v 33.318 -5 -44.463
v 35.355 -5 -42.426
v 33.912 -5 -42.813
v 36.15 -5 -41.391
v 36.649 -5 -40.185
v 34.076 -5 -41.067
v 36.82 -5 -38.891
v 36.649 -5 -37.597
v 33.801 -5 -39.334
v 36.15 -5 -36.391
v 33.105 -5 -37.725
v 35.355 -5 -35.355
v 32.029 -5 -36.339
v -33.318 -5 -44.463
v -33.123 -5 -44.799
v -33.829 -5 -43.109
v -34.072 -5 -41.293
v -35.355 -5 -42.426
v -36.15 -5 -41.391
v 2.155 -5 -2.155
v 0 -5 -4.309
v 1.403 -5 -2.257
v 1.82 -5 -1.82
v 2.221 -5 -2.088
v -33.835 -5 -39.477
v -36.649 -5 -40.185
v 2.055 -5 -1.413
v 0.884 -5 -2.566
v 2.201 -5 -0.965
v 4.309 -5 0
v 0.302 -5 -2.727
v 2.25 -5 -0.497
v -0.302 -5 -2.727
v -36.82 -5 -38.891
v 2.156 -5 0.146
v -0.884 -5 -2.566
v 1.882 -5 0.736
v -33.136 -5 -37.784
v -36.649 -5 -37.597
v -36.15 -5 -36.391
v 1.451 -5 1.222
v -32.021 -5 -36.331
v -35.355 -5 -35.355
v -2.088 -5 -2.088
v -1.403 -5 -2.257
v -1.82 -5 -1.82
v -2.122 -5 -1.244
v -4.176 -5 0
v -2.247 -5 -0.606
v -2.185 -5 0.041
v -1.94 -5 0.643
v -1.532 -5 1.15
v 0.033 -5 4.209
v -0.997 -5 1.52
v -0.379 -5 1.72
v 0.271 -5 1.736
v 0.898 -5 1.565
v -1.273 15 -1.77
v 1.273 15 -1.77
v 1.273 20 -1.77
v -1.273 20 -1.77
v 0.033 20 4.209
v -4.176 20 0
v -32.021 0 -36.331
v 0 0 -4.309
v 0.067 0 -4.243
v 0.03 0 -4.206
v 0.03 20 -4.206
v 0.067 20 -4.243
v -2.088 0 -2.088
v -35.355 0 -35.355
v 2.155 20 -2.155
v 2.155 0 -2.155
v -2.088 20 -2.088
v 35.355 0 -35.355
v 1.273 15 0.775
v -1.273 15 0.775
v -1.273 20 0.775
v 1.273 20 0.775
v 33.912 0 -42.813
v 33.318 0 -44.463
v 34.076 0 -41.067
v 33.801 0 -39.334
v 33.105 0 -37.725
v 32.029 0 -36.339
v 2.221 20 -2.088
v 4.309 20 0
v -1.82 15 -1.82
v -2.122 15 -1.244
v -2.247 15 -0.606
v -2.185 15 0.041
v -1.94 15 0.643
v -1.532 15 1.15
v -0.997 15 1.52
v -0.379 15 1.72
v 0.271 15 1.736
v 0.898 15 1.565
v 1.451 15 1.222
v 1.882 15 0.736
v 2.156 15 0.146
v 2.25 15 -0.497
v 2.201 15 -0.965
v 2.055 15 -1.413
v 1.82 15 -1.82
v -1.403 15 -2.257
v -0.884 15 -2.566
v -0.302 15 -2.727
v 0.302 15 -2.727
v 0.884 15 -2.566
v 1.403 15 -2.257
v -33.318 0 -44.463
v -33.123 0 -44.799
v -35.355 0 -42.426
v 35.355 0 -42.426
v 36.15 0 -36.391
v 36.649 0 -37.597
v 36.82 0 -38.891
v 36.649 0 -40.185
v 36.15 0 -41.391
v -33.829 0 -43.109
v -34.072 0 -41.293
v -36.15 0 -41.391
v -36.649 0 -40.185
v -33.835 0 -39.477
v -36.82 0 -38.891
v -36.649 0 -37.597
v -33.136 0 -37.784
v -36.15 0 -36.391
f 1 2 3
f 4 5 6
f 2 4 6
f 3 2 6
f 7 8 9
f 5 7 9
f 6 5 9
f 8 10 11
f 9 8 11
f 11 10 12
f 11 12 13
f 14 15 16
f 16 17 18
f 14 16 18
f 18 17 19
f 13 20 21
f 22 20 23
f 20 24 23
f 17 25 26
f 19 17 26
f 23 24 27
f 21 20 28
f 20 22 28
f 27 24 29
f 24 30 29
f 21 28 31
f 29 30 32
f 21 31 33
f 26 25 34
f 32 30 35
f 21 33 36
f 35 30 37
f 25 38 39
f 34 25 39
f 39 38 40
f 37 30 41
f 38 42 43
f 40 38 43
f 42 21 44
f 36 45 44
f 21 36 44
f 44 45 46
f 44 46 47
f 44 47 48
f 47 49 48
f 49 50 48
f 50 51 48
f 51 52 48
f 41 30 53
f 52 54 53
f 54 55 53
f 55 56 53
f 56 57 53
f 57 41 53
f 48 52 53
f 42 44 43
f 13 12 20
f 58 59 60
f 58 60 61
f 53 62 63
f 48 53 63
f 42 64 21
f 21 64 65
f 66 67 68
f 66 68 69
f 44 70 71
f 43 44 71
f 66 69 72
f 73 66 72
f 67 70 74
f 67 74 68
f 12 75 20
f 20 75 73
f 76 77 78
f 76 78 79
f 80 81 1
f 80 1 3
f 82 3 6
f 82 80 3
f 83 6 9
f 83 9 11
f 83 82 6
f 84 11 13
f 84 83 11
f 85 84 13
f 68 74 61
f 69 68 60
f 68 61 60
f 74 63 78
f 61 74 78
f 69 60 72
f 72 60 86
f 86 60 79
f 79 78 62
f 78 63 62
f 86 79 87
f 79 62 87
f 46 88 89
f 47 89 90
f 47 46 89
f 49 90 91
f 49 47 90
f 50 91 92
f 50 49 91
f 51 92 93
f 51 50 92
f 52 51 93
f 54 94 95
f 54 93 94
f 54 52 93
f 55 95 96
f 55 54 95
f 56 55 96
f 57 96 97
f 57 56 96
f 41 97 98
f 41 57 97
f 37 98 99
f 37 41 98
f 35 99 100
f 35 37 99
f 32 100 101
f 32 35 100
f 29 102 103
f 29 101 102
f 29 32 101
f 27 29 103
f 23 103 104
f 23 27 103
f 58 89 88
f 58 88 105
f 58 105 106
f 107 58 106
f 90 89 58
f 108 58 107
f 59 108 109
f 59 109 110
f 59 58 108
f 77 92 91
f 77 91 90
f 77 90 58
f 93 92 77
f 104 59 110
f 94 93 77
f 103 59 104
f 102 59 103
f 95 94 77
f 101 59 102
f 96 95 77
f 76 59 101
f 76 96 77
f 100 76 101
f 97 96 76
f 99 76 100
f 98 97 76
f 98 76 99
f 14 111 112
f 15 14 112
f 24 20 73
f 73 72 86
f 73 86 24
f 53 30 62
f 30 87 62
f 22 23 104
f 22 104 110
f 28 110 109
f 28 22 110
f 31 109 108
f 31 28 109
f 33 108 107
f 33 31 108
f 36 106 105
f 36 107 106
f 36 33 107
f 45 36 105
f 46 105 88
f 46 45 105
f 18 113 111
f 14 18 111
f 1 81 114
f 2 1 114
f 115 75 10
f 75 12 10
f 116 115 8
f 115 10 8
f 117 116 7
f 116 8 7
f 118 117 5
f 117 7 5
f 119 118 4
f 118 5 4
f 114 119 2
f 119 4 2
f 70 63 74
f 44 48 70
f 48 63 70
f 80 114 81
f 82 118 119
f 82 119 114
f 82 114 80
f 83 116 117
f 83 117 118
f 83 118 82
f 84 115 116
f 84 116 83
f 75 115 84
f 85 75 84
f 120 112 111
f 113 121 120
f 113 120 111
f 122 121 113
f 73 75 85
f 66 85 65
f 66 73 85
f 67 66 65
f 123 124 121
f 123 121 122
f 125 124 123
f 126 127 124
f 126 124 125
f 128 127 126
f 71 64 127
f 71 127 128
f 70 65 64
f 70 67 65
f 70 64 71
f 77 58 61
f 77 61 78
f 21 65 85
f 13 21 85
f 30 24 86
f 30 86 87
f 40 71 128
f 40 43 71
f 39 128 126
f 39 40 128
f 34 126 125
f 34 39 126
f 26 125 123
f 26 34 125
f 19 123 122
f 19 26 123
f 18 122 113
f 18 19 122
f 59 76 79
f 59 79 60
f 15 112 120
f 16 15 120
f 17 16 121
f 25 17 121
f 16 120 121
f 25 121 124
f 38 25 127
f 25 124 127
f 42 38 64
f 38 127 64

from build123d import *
from build123d import SkipClean  # not in build123d's __all__

# Parameters (mm, degrees)
F1_DEPTH    = 5
F2_DEPTH    = 20
F3_R        = 5
F4_START    = -15
F4_DEPTH    = 5
F5_T1_DEPTH = 5


# Not quite as in the source:
# - a fillet or chamfer that OpenCascade refuses, or shapes differently, is made with other operations: its cross-section is extruded or revolved along the edge and cut away or added
# - after a boolean that leaves OpenCascade's solid faulty, fix() repairs it
# - a feature names something its author has since deleted; it is built from what else it names


with BuildPart() as f1:
    # F0 (on Front) → F1 (new body)
    with BuildSketch(Plane.XZ):
        with BuildLine():
            Line((0.0300982685, -4.2060010783), (-2.0879514049, -2.0879514049))
            Line((-2.0879514049, -2.0879514049), (-38.8908729653, -38.8908729653))
            Line((-38.8908729653, -38.8908729653), (-33.3183881591, -44.4633577714))
            Line((-33.3183881591, -44.4633577714), (-33.1233781652, -44.7987950851))
            ThreePointArc((-33.1233781652, -44.7987950851), (-34.0132139837, -40.3773459148), (-32.0214836094, -36.3308621737))
            Line((-32.0214836094, -36.3308621737), (0, -4.3093785644))
            Line((0, -4.3093785644), (0.0667378772, -4.2426406871))
            Line((0.0667378772, -4.2426406871), (0.0300982685, -4.2060010783))
        make_face()
        with BuildLine():
            Line((-4.1759028099, 0), (-2.0879514049, -2.0879514049))
            Line((-2.0879514049, -2.0879514049), (-1.8201223283, -1.8201223283))
            ThreePointArc((-1.8201223283, -1.8201223283), (-0.6954224476, 1.6424563629), (2.25, -0.4973771865))
            ThreePointArc((2.25, -0.4973771865), (2.1398335494, -1.1927996342), (1.8201223283, -1.8201223283))
            Line((1.8201223283, -1.8201223283), (2.1546892822, -2.1546892822))
            Line((2.1546892822, -2.1546892822), (2.2214271594, -2.0879514049))
            Line((2.2214271594, -2.0879514049), (4.3093785644, 0))
            Line((4.3093785644, 0), (0.0333689386, 4.2092717485))
            Line((0.0333689386, 4.2092717485), (-4.1759028099, 0))
        make_face()
        with BuildLine():
            Line((-1.8201223283, -1.8201223283), (-2.0879514049, -2.0879514049))
            Line((-2.0879514049, -2.0879514049), (0.0300982685, -4.2060010783))
            Line((0.0300982685, -4.2060010783), (0.0667378772, -4.2426406871))
            Line((0.0667378772, -4.2426406871), (2.1546892822, -2.1546892822))
            Line((2.1546892822, -2.1546892822), (1.8201223283, -1.8201223283))
            ThreePointArc((1.8201223283, -1.8201223283), (0, -2.7473771865), (-1.8201223283, -1.8201223283))
        make_face()
        Polygon((2.1546892822, -2.1546892822), (0.0667378772, -4.2426406871), (0, -4.3093785644), (35.8313777613, -40.1407563256), (33.3183881591, -44.4633577714), (38.8908729653, -38.8908729653), align=None)
    extrude(amount=F1_DEPTH)

    # F0 (on Front) → F2 (join)
    with BuildSketch(Plane.XZ):
        with BuildLine():
            Line((-4.1759028099, 0), (-2.0879514049, -2.0879514049))
            Line((-2.0879514049, -2.0879514049), (-1.8201223283, -1.8201223283))
            ThreePointArc((-1.8201223283, -1.8201223283), (-0.6954224476, 1.6424563629), (2.25, -0.4973771865))
            ThreePointArc((2.25, -0.4973771865), (2.1398335494, -1.1927996342), (1.8201223283, -1.8201223283))
            Line((1.8201223283, -1.8201223283), (2.1546892822, -2.1546892822))
            Line((2.1546892822, -2.1546892822), (2.2214271594, -2.0879514049))
            Line((2.2214271594, -2.0879514049), (4.3093785644, 0))
            Line((4.3093785644, 0), (0.0333689386, 4.2092717485))
            Line((0.0333689386, 4.2092717485), (-4.1759028099, 0))
        make_face()
        with BuildLine():
            Line((-1.8201223283, -1.8201223283), (-2.0879514049, -2.0879514049))
            Line((-2.0879514049, -2.0879514049), (0.0300982685, -4.2060010783))
            Line((0.0300982685, -4.2060010783), (0.0667378772, -4.2426406871))
            Line((0.0667378772, -4.2426406871), (2.1546892822, -2.1546892822))
            Line((2.1546892822, -2.1546892822), (1.8201223283, -1.8201223283))
            ThreePointArc((1.8201223283, -1.8201223283), (0, -2.7473771865), (-1.8201223283, -1.8201223283))
        make_face()
    with SkipClean():  # cleaning this boolean's faces spoils the solid; the shape is the same uncleaned
        extrude(amount=-F2_DEPTH)

    # F3
    f3_edges = [f1.edges().sort_by_distance(p)[0] for p in [
        (38.890873, -2.5, -38.890873),
        (-38.890873, -2.5, -38.890873),
    ]]
    fillet(f3_edges, radius=F3_R)

    # F0 (on Front) → F4 (join)
    with BuildSketch(Plane.XZ.offset(F4_START)):
        with BuildLine():
            Line((1.2727922061, -1.2727922061), (1.4969489762, -1.4969489762))
            ThreePointArc((1.4969489762, -1.4969489762), (1.7225719371, -1.0196280089), (1.8, -0.4973771865))
            ThreePointArc((1.8, -0.4973771865), (1.6629831585, 0.1914529917), (1.2727922061, 0.7754150196))
            Line((1.2727922061, 0.7754150196), (1.2727922061, -1.2727922061))
        make_face()
        with BuildLine():
            ThreePointArc((1.2727922061, -1.7701693927), (1.3915922187, -1.6390737735), (1.4969489762, -1.4969489762))
            Line((1.4969489762, -1.4969489762), (1.2727922061, -1.2727922061))
            Line((1.2727922061, -1.2727922061), (1.2727922061, -1.7701693927))
        make_face()
        with BuildLine():
            Line((-1.2727922061, -1.2727922061), (-1.4969489762, -1.4969489762))
            ThreePointArc((-1.4969489762, -1.4969489762), (-1.3915922187, -1.6390737735), (-1.2727922061, -1.7701693927))
            Line((-1.2727922061, -1.7701693927), (-1.2727922061, -1.2727922061))
        make_face()
        with BuildLine():
            Line((1.2727922061, -1.7701693927), (-1.2727922061, -1.7701693927))
            ThreePointArc((-1.2727922061, -1.7701693927), (0, -2.2973771865), (1.2727922061, -1.7701693927))
        make_face()
        with BuildLine():
            ThreePointArc((-1.2727922061, 0.7754150196), (-1.7913056932, -0.3206742907), (-1.4969489762, -1.4969489762))
            Line((-1.4969489762, -1.4969489762), (-1.2727922061, -1.2727922061))
            Line((-1.2727922061, -1.2727922061), (-1.2727922061, 0.7754150196))
        make_face()
        with BuildLine():
            ThreePointArc((1.2727922061, 0.7754150196), (0, 1.3026228135), (-1.2727922061, 0.7754150196))
            Line((-1.2727922061, 0.7754150196), (1.2727922061, 0.7754150196))
        make_face()
        with BuildLine():
            ThreePointArc((2.25, -0.4973771865), (-0.6954224476, 1.6424563629), (-1.8201223283, -1.8201223283))
            Line((-1.8201223283, -1.8201223283), (-1.4969489762, -1.4969489762))
            ThreePointArc((-1.4969489762, -1.4969489762), (-1.7913056932, -0.3206742907), (-1.2727922061, 0.7754150196))
            ThreePointArc((-1.2727922061, 0.7754150196), (0, 1.3026228135), (1.2727922061, 0.7754150196))
            ThreePointArc((1.2727922061, 0.7754150196), (1.6629831585, 0.1914529917), (1.8, -0.4973771865))
            ThreePointArc((1.8, -0.4973771865), (1.7225719371, -1.0196280089), (1.4969489762, -1.4969489762))
            Line((1.4969489762, -1.4969489762), (1.8201223283, -1.8201223283))
            ThreePointArc((1.8201223283, -1.8201223283), (2.1398335494, -1.1927996342), (2.25, -0.4973771865))
        make_face()
        with BuildLine():
            Line((-1.4969489762, -1.4969489762), (-1.8201223283, -1.8201223283))
            ThreePointArc((-1.8201223283, -1.8201223283), (0, -2.7473771865), (1.8201223283, -1.8201223283))
            Line((1.8201223283, -1.8201223283), (1.4969489762, -1.4969489762))
            ThreePointArc((1.4969489762, -1.4969489762), (1.3915922187, -1.6390737735), (1.2727922061, -1.7701693927))
            ThreePointArc((1.2727922061, -1.7701693927), (0, -2.2973771865), (-1.2727922061, -1.7701693927))
            ThreePointArc((-1.2727922061, -1.7701693927), (-1.3915922187, -1.6390737735), (-1.4969489762, -1.4969489762))
        make_face()
    extrude(amount=-F4_DEPTH)

    add(f1.part.fix(), mode=Mode.REPLACE)

    # F5: fillet of radius 7 on 1 edges, made by hand

    # F5_s2 → F5_t1 (join)
    with BuildSketch(Plane.XZ):
        with BuildLine():
            ThreePointArc((33.3183881591, -44.4633577714), (33.9932652456, -40.1917985218), (32.0294732352, -36.3388517995))
            Line((32.0294732352, -36.3388517995), (35.8313777613, -40.1407563256))
            Line((35.8313777613, -40.1407563256), (33.3183881591, -44.4633577714))
        make_face()
    extrude(amount=F5_T1_DEPTH)


solid = f1.part
